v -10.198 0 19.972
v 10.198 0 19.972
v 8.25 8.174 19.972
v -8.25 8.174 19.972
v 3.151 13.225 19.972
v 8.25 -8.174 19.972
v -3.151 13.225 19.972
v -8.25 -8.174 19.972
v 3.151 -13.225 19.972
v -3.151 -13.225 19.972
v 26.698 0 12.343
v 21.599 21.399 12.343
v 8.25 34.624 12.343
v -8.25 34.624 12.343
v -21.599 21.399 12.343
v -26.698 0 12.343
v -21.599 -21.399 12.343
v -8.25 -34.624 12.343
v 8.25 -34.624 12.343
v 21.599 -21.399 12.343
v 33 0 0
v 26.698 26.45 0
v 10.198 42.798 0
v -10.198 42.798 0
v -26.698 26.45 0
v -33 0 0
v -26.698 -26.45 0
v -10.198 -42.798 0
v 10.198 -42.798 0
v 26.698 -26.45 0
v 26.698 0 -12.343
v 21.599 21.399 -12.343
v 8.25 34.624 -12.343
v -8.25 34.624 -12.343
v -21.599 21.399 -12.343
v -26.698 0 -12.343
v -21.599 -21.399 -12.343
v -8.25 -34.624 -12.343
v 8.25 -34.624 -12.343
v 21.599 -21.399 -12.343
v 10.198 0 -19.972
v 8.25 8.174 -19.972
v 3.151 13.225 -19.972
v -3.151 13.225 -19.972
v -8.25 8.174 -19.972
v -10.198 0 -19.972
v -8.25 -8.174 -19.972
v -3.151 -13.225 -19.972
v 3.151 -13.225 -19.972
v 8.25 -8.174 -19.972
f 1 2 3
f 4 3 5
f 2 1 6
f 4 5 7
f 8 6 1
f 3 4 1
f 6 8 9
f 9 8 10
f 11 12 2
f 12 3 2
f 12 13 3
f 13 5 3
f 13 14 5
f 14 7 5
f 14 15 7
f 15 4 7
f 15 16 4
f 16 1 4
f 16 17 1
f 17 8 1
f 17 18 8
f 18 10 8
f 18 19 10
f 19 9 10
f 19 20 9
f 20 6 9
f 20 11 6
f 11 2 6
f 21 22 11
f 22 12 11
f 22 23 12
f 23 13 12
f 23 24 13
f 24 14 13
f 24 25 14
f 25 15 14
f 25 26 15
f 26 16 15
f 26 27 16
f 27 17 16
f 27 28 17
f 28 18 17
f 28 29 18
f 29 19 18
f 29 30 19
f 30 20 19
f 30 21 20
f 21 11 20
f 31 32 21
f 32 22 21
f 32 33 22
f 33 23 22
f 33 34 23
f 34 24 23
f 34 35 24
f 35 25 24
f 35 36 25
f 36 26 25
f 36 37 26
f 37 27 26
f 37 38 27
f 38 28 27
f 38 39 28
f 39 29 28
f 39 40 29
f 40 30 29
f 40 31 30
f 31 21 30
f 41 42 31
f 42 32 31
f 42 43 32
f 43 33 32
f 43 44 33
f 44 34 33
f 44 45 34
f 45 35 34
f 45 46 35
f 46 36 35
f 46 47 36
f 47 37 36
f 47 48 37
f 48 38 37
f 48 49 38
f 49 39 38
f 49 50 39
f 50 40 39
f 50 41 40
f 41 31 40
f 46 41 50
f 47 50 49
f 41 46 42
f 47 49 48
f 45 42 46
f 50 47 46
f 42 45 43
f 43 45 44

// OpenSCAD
// Generated by SolidPython 1.0.1 on 2020-07-29 00:46:50


scale(v = [11, 15, 7]) {
	sphere(r = 3);
}
/***********************************************
*********      SolidPython code:      **********
************************************************
 
# import packages: SolidPython
from solid import *
from solid.utils import *
from itertools import chain, combinations, permutations


class Resize:

    def __init__(self, scad_file):
        self.scad_file = scad_file
        #self.scad_file = import_scad(scad_file)
        # cone/cylinder param:
        self.r1 = 0
        self.r2 = 0
        self.h = 0
        # rectangular prism param:
        self.w = 0
        self.l = 0
        # ellipse param:
        self.r = 0

    # import OpenScad code (file name corresponds to shape)


    # classify shape + parameters
    def assign(self, param1, param2, param3):
        if self.scad_file == 'cone.scad':
            self.r1 = param1
            self.r2 = param2
            self.h = param3
        elif self.scad_file == 'cylinder.scad':
            self.r1 = param1
            self.r2 = param2
            self.h = param3
        elif self.scad_file == 'rectangularPrism.scad':
            self.h = param1
            self.l = param2
            self.w = param3
        else:
            self.r = param1
            self.h = param2

    # resize parameters
    def iterate(self):
        x = range(3, 20, 2)
        i = 1
        if self.scad_file == 'cone.scad':
            tempList = list(permutations(x, 2))
            for temp in tempList:
                param1 = temp[0]
                param2 = temp[1]
                filepath = 'produced_scad_files/' + 'cone' + str(param1) + '_' + str(param2) + '_' + '.scad'
                scad_render_to_file(cylinder(h=param1, r1=param2, r2=0), filepath)

        elif self.scad_file == 'cylinder.scad':
            tempList = list(permutations(x, 3))
            for temp in tempList:
                param1 = temp[0]
                param2 = temp[1]
                filepath = 'produced_scad_files/' + 'cylinder' + str(param1) + '_' + str(param2) + '_' + '.scad'
                scad_render_to_file(cylinder(h=param1, r1=param2, r2=param2), filepath)

        elif self.scad_file == 'rectangularPrism.scad':
            tempList = list(permutations(x, 3))
            for temp in tempList:
                param1 = temp[0]
                param2 = temp[1]
                param3 = temp[2]
                filepath = 'produced_scad_files/' + 'rectangularPrism' + str(param1) + '_' + str(param2) + '_' + str(
                    param3) + '.scad'
                scad_render_to_file(cube(size=(param1, param2, param3)), filepath)

        elif self.scad_file == 'ellipse.scad':
            tempList = list(permutations(x, 4))
            for temp in tempList:
                param1 = temp[0]
                param2 = temp[1]
                param3 = temp[2]
                param4 = temp[3]
                filepath = 'produced_scad_files/' + 'ellipse' + str(param1) + '_' + str(param2) + '_' + str(param3) + '_' + str(param4) + '.scad'
                scad_render_to_file(scale([param1, param2, param3])(sphere(r=param4)), filepath)

    def render_to_scadfile(self):
        scad_render_to_file(scad, 'example.scad') 
 
************************************************/
